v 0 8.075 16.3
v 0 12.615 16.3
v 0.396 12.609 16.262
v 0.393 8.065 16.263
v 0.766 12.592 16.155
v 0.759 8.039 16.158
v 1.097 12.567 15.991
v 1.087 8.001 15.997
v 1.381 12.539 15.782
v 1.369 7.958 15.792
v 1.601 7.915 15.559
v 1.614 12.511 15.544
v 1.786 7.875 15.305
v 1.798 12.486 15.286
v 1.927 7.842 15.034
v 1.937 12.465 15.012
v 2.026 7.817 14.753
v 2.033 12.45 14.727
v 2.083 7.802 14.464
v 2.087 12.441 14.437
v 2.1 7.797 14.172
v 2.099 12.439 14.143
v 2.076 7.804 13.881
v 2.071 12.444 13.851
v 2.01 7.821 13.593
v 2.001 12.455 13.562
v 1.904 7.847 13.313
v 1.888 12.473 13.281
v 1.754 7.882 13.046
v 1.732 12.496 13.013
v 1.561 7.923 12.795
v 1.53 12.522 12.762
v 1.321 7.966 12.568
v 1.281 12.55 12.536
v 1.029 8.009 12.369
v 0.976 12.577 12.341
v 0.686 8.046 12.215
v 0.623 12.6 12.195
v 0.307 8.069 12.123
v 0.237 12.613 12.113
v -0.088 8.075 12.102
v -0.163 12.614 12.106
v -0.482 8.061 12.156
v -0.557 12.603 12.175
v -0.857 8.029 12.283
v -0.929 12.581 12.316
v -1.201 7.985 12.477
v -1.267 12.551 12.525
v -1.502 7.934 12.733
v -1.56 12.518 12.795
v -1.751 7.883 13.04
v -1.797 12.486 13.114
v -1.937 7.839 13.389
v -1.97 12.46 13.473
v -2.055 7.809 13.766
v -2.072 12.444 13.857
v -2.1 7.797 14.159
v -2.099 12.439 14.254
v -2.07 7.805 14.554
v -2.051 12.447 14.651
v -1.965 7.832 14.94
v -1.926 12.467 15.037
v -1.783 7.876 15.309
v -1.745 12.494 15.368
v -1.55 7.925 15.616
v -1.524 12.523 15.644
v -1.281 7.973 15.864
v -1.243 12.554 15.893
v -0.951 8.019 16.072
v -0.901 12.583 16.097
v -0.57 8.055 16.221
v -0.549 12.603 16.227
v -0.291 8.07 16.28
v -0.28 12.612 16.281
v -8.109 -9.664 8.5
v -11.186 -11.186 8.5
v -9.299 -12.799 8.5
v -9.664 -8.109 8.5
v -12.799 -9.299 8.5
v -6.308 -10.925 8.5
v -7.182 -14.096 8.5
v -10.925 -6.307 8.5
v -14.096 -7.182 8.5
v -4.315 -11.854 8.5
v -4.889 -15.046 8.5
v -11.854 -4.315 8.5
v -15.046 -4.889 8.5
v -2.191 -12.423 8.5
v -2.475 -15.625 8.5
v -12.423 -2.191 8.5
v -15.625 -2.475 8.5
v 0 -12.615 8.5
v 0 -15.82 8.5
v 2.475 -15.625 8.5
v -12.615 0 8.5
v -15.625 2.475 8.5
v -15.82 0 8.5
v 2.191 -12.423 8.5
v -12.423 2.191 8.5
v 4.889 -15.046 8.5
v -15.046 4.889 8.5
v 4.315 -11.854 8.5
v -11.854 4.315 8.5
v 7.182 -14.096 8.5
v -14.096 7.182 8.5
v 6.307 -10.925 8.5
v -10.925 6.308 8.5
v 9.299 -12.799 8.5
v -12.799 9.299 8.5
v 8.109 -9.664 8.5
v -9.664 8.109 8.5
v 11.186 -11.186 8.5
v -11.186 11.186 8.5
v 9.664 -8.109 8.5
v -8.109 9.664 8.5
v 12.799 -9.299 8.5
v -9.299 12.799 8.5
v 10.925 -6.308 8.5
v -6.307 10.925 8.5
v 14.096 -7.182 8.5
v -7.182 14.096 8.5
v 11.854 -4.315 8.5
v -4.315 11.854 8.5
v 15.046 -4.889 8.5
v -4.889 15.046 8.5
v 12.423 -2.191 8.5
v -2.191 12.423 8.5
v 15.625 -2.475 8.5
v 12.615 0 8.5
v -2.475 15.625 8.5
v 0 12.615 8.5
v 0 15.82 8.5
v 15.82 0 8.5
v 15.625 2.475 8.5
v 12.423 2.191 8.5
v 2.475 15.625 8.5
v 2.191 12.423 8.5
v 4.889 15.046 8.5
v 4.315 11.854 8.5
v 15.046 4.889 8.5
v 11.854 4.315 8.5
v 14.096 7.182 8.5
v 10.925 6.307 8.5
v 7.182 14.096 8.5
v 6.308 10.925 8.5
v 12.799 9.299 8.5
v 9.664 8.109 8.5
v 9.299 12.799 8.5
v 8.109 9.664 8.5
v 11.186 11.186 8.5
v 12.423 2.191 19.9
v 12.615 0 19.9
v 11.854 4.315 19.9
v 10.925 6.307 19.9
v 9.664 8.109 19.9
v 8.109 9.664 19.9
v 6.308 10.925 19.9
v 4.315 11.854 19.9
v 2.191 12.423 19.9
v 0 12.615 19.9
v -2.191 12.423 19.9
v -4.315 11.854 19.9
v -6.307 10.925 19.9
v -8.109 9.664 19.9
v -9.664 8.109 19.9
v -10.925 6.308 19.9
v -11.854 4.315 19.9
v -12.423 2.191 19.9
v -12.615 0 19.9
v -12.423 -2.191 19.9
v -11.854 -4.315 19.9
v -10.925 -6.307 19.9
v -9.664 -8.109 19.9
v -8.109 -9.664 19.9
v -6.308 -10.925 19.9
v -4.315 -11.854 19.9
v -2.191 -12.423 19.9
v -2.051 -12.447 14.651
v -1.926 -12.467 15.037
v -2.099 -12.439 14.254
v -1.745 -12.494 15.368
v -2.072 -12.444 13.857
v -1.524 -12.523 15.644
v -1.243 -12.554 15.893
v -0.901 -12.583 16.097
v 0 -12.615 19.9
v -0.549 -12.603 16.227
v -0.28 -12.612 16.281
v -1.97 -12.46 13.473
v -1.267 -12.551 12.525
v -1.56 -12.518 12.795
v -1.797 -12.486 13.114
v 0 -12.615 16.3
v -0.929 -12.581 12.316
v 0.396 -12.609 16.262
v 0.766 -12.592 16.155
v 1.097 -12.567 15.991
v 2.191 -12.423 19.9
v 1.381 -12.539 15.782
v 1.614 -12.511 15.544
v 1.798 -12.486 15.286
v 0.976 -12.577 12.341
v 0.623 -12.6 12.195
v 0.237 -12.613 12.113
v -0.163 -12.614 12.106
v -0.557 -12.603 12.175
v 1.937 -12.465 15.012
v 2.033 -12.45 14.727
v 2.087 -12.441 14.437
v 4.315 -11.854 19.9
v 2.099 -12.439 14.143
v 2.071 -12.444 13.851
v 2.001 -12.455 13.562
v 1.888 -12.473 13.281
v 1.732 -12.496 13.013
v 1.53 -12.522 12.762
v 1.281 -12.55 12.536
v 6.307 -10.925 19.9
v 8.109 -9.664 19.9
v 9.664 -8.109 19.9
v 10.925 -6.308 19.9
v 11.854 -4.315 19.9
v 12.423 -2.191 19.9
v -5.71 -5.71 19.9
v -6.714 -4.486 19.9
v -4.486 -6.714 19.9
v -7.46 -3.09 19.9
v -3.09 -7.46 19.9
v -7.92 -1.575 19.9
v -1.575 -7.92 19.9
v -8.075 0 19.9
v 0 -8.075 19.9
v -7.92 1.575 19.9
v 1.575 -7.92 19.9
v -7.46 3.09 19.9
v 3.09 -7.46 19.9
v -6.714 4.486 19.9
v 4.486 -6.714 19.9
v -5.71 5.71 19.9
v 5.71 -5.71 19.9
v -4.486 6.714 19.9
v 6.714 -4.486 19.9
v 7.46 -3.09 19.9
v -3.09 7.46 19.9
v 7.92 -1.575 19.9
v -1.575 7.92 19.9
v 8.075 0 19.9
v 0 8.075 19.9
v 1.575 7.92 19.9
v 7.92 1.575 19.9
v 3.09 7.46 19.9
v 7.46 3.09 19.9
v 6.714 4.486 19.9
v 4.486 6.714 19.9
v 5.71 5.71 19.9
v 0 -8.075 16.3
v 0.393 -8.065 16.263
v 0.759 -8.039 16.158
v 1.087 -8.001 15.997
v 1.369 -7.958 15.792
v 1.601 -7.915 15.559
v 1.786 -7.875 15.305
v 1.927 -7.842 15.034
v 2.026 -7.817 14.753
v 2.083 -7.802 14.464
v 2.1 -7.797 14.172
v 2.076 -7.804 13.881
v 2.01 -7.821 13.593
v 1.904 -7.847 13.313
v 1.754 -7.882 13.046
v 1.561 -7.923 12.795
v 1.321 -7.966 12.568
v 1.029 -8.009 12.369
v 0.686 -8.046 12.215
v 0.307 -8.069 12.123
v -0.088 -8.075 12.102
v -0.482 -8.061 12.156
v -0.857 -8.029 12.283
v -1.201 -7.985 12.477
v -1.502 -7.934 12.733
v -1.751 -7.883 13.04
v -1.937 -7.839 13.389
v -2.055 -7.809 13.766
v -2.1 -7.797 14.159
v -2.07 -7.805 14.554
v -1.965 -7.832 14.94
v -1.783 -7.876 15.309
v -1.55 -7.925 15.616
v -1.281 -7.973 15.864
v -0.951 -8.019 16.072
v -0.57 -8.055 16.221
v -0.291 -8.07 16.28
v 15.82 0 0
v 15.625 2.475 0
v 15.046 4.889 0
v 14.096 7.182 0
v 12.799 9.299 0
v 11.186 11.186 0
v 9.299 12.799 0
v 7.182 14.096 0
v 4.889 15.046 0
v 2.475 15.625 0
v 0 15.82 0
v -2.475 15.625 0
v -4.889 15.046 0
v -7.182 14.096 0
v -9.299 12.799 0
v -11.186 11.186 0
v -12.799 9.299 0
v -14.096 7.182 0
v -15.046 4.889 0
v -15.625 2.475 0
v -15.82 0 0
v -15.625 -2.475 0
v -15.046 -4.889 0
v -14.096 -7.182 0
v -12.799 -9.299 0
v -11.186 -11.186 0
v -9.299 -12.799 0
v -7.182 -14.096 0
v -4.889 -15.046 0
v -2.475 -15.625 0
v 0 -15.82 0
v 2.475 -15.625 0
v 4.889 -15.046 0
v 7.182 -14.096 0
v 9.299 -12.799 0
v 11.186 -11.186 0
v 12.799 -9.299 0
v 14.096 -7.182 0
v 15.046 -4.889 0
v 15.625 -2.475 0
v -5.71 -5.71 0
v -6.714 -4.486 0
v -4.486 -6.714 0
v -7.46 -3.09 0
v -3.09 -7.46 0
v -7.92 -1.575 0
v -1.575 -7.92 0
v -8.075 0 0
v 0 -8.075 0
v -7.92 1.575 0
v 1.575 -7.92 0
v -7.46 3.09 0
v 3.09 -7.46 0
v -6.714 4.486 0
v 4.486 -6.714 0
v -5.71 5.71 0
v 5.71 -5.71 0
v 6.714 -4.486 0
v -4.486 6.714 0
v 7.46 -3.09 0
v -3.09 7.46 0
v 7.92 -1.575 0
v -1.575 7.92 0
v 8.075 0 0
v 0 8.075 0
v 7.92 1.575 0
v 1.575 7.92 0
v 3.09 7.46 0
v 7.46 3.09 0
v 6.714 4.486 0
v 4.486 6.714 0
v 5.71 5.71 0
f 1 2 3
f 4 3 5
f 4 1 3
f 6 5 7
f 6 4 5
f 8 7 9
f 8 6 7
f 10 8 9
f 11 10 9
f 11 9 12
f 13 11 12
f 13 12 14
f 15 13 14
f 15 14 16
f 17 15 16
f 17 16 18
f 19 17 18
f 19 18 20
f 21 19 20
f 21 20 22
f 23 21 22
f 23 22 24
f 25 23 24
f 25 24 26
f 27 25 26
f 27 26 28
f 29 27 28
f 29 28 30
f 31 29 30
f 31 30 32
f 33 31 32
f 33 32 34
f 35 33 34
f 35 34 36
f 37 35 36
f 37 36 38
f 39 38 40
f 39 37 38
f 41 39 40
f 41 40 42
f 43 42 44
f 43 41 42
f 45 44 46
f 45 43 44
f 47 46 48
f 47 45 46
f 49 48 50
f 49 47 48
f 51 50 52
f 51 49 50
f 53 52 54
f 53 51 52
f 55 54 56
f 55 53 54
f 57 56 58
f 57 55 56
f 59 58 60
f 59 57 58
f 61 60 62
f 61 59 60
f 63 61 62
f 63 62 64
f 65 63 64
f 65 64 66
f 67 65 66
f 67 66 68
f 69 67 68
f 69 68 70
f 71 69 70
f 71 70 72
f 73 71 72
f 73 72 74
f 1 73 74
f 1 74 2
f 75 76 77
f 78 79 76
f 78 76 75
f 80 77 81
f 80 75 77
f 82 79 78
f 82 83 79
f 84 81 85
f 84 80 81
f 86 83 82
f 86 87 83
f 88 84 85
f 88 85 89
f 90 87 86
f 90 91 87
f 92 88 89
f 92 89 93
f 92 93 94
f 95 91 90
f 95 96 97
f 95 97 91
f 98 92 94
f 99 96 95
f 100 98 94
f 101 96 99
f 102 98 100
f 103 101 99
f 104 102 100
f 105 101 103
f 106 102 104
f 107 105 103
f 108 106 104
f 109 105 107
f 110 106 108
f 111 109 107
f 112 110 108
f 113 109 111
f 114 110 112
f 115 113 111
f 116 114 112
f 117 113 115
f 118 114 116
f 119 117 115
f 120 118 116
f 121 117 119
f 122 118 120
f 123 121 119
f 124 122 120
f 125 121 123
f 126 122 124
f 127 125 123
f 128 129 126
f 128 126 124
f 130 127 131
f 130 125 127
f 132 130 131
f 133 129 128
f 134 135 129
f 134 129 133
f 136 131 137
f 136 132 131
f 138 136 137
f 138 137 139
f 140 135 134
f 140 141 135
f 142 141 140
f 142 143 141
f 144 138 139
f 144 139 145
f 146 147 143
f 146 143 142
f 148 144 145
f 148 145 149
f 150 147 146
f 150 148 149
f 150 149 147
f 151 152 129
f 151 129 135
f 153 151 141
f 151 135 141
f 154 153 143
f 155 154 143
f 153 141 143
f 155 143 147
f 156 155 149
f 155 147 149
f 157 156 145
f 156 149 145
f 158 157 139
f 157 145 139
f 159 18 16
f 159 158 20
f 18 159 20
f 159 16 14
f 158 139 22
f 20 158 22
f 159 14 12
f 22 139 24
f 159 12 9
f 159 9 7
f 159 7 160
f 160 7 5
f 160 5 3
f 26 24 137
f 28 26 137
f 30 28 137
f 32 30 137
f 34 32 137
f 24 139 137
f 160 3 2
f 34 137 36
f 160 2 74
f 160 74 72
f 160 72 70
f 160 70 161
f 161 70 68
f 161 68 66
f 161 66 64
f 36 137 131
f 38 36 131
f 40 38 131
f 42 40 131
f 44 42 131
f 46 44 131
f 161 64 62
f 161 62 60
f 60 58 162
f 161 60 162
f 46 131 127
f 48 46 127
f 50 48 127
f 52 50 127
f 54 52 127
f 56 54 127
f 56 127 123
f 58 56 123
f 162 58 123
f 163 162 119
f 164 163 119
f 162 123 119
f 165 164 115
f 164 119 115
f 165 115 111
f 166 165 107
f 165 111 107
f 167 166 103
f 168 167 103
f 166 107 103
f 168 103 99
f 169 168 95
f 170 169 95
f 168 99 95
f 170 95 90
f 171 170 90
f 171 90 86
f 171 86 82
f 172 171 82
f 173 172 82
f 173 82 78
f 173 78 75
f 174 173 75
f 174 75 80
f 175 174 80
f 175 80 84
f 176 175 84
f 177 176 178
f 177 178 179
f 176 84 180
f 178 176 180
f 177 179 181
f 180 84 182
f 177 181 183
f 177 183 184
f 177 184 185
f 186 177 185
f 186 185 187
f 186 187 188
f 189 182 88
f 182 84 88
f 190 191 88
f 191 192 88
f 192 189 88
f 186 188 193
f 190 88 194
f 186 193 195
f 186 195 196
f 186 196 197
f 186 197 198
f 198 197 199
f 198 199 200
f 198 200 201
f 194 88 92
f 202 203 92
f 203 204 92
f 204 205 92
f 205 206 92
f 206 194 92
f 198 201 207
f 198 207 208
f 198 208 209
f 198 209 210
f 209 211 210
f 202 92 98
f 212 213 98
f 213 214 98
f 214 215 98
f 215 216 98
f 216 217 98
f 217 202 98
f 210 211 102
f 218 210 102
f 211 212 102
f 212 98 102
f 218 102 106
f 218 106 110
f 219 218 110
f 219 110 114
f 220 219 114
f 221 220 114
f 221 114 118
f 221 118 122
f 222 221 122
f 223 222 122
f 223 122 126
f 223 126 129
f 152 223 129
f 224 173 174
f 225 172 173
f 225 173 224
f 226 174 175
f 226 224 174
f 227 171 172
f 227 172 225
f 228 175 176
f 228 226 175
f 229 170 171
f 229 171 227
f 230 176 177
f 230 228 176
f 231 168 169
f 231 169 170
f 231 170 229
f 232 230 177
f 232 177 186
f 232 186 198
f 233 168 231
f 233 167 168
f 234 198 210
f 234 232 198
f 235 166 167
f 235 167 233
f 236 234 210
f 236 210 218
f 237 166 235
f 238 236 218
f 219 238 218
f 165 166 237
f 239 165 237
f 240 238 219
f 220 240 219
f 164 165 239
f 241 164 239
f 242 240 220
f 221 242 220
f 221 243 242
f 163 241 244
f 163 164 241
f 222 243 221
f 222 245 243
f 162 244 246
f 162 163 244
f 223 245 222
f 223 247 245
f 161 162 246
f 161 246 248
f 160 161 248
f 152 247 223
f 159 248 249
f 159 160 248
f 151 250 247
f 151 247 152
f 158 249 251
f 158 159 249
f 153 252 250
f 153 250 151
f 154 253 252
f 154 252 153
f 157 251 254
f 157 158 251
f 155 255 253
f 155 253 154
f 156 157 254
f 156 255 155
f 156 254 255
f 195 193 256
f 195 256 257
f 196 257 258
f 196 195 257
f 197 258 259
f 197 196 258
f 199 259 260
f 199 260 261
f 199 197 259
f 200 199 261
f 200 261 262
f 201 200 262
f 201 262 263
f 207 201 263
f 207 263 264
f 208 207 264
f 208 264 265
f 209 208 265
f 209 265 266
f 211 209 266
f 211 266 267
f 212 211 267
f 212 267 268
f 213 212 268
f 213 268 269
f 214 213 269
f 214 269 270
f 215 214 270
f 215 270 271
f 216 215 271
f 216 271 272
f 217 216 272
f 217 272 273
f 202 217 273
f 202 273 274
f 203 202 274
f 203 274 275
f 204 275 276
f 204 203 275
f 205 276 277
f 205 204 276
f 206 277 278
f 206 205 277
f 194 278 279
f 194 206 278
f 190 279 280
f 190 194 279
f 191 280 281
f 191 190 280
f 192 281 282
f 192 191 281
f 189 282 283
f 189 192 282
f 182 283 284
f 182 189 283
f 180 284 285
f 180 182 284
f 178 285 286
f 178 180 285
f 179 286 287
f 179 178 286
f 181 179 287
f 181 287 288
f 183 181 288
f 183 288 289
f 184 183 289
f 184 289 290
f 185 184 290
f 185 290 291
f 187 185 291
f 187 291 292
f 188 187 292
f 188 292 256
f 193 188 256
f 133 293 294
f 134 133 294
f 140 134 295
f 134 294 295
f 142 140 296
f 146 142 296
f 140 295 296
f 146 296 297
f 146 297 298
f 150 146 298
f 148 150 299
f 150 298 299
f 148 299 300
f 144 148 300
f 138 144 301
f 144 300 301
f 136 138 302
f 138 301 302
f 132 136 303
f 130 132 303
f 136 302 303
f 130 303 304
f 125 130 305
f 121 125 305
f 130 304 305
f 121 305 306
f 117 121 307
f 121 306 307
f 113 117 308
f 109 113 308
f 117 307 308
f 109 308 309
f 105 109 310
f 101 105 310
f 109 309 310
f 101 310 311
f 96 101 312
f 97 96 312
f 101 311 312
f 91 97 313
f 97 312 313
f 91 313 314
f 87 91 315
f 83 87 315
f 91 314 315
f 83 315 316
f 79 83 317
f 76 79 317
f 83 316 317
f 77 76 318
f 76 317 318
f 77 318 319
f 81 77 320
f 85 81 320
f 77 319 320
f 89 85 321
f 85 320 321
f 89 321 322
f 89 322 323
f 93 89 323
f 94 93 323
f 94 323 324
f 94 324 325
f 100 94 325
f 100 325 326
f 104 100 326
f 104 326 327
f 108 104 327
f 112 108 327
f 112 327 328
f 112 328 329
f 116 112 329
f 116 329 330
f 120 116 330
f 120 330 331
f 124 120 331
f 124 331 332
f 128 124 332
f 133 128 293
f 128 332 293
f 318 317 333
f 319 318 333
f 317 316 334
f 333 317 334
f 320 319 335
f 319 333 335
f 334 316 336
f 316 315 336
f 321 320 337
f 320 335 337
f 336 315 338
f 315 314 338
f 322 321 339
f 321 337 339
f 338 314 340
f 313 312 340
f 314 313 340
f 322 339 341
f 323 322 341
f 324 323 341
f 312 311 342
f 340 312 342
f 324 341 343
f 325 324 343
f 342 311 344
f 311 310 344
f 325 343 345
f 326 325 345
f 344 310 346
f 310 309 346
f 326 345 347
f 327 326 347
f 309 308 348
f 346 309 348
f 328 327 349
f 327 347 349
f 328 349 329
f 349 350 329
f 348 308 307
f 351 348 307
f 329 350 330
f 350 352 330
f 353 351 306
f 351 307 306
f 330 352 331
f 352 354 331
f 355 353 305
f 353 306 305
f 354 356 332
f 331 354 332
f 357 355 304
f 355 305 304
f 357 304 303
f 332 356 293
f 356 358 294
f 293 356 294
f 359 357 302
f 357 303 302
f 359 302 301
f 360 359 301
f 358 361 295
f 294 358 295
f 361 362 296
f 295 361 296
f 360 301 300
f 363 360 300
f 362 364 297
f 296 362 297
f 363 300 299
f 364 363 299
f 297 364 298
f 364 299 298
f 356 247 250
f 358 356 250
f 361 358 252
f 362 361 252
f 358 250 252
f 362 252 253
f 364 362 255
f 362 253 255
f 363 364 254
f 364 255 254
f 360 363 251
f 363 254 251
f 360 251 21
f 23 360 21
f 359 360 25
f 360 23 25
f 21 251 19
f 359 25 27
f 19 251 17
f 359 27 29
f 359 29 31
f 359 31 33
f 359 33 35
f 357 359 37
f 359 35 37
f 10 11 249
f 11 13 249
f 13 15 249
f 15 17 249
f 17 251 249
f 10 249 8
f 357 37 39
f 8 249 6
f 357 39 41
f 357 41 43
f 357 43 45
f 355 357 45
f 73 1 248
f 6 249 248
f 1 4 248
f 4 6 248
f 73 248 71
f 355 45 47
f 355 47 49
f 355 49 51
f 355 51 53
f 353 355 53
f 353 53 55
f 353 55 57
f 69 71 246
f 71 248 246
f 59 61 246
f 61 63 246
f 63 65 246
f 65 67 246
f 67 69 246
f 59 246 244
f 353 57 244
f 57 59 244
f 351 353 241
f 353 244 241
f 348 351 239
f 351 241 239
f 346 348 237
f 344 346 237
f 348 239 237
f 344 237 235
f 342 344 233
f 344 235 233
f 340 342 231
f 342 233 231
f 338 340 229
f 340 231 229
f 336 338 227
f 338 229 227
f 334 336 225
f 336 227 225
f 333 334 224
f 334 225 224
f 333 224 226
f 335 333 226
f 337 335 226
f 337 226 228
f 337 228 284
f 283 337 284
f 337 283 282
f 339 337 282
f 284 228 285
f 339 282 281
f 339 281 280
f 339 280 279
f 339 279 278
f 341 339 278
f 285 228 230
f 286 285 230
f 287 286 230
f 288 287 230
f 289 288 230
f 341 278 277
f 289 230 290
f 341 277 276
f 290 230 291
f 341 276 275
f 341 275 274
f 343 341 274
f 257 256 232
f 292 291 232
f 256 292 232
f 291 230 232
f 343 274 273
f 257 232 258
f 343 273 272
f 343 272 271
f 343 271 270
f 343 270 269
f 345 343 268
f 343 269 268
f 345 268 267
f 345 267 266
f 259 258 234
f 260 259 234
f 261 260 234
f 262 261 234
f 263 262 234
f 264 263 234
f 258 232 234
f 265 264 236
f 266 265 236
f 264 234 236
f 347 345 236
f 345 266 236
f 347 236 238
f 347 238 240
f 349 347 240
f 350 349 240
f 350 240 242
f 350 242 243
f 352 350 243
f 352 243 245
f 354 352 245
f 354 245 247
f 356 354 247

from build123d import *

# Parameters (mm, degrees)
SKETCH1_R               = 15.82
BOSS_EXTRUDE1_DEPTH     = 8.5
SKETCH2_R               = 12.615
BOSS_EXTRUDE2_DEPTH     = 11.4
SKETCH3_R               = 8.075
CUT_EXTRUDE1_DEPTH      = 30.942524944
CUT_EXTRUDE2_DEPTH      = 30.942524944
CUT_EXTRUDE2_DEPTH_BACK = 30.942524944
SKETCH4_R               = 2.1


with BuildPart() as part:
    # Sketch1 → Boss-Extrude1 (new body)
    with BuildSketch(Plane(origin=(0, 0, 0), x_dir=(0, 1, 0), z_dir=(0, 0, 1))):
        with Locations(Location((0, 0, 0), (0, 0, 270))):
            Circle(SKETCH1_R)
    extrude(amount=BOSS_EXTRUDE1_DEPTH)

    # Sketch2 → Boss-Extrude2 (add)
    with BuildSketch(Plane.XY.offset(8.5)):
        Circle(SKETCH2_R)
    extrude(amount=BOSS_EXTRUDE2_DEPTH)

    # Sketch3 → Cut-Extrude1 (cut, through all)
    with BuildSketch(Plane.XY.offset(19.9)):
        Circle(SKETCH3_R)
    extrude(amount=-CUT_EXTRUDE1_DEPTH, mode=Mode.SUBTRACT)

    # Sketch4 → Cut-Extrude2 (cut, two sides: drawn at the far end of the back side and taken through both)
    with BuildSketch(Plane(origin=(0, 0, 0), x_dir=(-1, 0, 0), z_dir=(0, 1, 0)).offset(-CUT_EXTRUDE2_DEPTH_BACK)):
        with Locations(Location((0, 14.2, 0), (0, 0, 90))):
            Circle(SKETCH4_R)
    extrude(amount=CUT_EXTRUDE2_DEPTH + CUT_EXTRUDE2_DEPTH_BACK, mode=Mode.SUBTRACT)


solid = part.part
